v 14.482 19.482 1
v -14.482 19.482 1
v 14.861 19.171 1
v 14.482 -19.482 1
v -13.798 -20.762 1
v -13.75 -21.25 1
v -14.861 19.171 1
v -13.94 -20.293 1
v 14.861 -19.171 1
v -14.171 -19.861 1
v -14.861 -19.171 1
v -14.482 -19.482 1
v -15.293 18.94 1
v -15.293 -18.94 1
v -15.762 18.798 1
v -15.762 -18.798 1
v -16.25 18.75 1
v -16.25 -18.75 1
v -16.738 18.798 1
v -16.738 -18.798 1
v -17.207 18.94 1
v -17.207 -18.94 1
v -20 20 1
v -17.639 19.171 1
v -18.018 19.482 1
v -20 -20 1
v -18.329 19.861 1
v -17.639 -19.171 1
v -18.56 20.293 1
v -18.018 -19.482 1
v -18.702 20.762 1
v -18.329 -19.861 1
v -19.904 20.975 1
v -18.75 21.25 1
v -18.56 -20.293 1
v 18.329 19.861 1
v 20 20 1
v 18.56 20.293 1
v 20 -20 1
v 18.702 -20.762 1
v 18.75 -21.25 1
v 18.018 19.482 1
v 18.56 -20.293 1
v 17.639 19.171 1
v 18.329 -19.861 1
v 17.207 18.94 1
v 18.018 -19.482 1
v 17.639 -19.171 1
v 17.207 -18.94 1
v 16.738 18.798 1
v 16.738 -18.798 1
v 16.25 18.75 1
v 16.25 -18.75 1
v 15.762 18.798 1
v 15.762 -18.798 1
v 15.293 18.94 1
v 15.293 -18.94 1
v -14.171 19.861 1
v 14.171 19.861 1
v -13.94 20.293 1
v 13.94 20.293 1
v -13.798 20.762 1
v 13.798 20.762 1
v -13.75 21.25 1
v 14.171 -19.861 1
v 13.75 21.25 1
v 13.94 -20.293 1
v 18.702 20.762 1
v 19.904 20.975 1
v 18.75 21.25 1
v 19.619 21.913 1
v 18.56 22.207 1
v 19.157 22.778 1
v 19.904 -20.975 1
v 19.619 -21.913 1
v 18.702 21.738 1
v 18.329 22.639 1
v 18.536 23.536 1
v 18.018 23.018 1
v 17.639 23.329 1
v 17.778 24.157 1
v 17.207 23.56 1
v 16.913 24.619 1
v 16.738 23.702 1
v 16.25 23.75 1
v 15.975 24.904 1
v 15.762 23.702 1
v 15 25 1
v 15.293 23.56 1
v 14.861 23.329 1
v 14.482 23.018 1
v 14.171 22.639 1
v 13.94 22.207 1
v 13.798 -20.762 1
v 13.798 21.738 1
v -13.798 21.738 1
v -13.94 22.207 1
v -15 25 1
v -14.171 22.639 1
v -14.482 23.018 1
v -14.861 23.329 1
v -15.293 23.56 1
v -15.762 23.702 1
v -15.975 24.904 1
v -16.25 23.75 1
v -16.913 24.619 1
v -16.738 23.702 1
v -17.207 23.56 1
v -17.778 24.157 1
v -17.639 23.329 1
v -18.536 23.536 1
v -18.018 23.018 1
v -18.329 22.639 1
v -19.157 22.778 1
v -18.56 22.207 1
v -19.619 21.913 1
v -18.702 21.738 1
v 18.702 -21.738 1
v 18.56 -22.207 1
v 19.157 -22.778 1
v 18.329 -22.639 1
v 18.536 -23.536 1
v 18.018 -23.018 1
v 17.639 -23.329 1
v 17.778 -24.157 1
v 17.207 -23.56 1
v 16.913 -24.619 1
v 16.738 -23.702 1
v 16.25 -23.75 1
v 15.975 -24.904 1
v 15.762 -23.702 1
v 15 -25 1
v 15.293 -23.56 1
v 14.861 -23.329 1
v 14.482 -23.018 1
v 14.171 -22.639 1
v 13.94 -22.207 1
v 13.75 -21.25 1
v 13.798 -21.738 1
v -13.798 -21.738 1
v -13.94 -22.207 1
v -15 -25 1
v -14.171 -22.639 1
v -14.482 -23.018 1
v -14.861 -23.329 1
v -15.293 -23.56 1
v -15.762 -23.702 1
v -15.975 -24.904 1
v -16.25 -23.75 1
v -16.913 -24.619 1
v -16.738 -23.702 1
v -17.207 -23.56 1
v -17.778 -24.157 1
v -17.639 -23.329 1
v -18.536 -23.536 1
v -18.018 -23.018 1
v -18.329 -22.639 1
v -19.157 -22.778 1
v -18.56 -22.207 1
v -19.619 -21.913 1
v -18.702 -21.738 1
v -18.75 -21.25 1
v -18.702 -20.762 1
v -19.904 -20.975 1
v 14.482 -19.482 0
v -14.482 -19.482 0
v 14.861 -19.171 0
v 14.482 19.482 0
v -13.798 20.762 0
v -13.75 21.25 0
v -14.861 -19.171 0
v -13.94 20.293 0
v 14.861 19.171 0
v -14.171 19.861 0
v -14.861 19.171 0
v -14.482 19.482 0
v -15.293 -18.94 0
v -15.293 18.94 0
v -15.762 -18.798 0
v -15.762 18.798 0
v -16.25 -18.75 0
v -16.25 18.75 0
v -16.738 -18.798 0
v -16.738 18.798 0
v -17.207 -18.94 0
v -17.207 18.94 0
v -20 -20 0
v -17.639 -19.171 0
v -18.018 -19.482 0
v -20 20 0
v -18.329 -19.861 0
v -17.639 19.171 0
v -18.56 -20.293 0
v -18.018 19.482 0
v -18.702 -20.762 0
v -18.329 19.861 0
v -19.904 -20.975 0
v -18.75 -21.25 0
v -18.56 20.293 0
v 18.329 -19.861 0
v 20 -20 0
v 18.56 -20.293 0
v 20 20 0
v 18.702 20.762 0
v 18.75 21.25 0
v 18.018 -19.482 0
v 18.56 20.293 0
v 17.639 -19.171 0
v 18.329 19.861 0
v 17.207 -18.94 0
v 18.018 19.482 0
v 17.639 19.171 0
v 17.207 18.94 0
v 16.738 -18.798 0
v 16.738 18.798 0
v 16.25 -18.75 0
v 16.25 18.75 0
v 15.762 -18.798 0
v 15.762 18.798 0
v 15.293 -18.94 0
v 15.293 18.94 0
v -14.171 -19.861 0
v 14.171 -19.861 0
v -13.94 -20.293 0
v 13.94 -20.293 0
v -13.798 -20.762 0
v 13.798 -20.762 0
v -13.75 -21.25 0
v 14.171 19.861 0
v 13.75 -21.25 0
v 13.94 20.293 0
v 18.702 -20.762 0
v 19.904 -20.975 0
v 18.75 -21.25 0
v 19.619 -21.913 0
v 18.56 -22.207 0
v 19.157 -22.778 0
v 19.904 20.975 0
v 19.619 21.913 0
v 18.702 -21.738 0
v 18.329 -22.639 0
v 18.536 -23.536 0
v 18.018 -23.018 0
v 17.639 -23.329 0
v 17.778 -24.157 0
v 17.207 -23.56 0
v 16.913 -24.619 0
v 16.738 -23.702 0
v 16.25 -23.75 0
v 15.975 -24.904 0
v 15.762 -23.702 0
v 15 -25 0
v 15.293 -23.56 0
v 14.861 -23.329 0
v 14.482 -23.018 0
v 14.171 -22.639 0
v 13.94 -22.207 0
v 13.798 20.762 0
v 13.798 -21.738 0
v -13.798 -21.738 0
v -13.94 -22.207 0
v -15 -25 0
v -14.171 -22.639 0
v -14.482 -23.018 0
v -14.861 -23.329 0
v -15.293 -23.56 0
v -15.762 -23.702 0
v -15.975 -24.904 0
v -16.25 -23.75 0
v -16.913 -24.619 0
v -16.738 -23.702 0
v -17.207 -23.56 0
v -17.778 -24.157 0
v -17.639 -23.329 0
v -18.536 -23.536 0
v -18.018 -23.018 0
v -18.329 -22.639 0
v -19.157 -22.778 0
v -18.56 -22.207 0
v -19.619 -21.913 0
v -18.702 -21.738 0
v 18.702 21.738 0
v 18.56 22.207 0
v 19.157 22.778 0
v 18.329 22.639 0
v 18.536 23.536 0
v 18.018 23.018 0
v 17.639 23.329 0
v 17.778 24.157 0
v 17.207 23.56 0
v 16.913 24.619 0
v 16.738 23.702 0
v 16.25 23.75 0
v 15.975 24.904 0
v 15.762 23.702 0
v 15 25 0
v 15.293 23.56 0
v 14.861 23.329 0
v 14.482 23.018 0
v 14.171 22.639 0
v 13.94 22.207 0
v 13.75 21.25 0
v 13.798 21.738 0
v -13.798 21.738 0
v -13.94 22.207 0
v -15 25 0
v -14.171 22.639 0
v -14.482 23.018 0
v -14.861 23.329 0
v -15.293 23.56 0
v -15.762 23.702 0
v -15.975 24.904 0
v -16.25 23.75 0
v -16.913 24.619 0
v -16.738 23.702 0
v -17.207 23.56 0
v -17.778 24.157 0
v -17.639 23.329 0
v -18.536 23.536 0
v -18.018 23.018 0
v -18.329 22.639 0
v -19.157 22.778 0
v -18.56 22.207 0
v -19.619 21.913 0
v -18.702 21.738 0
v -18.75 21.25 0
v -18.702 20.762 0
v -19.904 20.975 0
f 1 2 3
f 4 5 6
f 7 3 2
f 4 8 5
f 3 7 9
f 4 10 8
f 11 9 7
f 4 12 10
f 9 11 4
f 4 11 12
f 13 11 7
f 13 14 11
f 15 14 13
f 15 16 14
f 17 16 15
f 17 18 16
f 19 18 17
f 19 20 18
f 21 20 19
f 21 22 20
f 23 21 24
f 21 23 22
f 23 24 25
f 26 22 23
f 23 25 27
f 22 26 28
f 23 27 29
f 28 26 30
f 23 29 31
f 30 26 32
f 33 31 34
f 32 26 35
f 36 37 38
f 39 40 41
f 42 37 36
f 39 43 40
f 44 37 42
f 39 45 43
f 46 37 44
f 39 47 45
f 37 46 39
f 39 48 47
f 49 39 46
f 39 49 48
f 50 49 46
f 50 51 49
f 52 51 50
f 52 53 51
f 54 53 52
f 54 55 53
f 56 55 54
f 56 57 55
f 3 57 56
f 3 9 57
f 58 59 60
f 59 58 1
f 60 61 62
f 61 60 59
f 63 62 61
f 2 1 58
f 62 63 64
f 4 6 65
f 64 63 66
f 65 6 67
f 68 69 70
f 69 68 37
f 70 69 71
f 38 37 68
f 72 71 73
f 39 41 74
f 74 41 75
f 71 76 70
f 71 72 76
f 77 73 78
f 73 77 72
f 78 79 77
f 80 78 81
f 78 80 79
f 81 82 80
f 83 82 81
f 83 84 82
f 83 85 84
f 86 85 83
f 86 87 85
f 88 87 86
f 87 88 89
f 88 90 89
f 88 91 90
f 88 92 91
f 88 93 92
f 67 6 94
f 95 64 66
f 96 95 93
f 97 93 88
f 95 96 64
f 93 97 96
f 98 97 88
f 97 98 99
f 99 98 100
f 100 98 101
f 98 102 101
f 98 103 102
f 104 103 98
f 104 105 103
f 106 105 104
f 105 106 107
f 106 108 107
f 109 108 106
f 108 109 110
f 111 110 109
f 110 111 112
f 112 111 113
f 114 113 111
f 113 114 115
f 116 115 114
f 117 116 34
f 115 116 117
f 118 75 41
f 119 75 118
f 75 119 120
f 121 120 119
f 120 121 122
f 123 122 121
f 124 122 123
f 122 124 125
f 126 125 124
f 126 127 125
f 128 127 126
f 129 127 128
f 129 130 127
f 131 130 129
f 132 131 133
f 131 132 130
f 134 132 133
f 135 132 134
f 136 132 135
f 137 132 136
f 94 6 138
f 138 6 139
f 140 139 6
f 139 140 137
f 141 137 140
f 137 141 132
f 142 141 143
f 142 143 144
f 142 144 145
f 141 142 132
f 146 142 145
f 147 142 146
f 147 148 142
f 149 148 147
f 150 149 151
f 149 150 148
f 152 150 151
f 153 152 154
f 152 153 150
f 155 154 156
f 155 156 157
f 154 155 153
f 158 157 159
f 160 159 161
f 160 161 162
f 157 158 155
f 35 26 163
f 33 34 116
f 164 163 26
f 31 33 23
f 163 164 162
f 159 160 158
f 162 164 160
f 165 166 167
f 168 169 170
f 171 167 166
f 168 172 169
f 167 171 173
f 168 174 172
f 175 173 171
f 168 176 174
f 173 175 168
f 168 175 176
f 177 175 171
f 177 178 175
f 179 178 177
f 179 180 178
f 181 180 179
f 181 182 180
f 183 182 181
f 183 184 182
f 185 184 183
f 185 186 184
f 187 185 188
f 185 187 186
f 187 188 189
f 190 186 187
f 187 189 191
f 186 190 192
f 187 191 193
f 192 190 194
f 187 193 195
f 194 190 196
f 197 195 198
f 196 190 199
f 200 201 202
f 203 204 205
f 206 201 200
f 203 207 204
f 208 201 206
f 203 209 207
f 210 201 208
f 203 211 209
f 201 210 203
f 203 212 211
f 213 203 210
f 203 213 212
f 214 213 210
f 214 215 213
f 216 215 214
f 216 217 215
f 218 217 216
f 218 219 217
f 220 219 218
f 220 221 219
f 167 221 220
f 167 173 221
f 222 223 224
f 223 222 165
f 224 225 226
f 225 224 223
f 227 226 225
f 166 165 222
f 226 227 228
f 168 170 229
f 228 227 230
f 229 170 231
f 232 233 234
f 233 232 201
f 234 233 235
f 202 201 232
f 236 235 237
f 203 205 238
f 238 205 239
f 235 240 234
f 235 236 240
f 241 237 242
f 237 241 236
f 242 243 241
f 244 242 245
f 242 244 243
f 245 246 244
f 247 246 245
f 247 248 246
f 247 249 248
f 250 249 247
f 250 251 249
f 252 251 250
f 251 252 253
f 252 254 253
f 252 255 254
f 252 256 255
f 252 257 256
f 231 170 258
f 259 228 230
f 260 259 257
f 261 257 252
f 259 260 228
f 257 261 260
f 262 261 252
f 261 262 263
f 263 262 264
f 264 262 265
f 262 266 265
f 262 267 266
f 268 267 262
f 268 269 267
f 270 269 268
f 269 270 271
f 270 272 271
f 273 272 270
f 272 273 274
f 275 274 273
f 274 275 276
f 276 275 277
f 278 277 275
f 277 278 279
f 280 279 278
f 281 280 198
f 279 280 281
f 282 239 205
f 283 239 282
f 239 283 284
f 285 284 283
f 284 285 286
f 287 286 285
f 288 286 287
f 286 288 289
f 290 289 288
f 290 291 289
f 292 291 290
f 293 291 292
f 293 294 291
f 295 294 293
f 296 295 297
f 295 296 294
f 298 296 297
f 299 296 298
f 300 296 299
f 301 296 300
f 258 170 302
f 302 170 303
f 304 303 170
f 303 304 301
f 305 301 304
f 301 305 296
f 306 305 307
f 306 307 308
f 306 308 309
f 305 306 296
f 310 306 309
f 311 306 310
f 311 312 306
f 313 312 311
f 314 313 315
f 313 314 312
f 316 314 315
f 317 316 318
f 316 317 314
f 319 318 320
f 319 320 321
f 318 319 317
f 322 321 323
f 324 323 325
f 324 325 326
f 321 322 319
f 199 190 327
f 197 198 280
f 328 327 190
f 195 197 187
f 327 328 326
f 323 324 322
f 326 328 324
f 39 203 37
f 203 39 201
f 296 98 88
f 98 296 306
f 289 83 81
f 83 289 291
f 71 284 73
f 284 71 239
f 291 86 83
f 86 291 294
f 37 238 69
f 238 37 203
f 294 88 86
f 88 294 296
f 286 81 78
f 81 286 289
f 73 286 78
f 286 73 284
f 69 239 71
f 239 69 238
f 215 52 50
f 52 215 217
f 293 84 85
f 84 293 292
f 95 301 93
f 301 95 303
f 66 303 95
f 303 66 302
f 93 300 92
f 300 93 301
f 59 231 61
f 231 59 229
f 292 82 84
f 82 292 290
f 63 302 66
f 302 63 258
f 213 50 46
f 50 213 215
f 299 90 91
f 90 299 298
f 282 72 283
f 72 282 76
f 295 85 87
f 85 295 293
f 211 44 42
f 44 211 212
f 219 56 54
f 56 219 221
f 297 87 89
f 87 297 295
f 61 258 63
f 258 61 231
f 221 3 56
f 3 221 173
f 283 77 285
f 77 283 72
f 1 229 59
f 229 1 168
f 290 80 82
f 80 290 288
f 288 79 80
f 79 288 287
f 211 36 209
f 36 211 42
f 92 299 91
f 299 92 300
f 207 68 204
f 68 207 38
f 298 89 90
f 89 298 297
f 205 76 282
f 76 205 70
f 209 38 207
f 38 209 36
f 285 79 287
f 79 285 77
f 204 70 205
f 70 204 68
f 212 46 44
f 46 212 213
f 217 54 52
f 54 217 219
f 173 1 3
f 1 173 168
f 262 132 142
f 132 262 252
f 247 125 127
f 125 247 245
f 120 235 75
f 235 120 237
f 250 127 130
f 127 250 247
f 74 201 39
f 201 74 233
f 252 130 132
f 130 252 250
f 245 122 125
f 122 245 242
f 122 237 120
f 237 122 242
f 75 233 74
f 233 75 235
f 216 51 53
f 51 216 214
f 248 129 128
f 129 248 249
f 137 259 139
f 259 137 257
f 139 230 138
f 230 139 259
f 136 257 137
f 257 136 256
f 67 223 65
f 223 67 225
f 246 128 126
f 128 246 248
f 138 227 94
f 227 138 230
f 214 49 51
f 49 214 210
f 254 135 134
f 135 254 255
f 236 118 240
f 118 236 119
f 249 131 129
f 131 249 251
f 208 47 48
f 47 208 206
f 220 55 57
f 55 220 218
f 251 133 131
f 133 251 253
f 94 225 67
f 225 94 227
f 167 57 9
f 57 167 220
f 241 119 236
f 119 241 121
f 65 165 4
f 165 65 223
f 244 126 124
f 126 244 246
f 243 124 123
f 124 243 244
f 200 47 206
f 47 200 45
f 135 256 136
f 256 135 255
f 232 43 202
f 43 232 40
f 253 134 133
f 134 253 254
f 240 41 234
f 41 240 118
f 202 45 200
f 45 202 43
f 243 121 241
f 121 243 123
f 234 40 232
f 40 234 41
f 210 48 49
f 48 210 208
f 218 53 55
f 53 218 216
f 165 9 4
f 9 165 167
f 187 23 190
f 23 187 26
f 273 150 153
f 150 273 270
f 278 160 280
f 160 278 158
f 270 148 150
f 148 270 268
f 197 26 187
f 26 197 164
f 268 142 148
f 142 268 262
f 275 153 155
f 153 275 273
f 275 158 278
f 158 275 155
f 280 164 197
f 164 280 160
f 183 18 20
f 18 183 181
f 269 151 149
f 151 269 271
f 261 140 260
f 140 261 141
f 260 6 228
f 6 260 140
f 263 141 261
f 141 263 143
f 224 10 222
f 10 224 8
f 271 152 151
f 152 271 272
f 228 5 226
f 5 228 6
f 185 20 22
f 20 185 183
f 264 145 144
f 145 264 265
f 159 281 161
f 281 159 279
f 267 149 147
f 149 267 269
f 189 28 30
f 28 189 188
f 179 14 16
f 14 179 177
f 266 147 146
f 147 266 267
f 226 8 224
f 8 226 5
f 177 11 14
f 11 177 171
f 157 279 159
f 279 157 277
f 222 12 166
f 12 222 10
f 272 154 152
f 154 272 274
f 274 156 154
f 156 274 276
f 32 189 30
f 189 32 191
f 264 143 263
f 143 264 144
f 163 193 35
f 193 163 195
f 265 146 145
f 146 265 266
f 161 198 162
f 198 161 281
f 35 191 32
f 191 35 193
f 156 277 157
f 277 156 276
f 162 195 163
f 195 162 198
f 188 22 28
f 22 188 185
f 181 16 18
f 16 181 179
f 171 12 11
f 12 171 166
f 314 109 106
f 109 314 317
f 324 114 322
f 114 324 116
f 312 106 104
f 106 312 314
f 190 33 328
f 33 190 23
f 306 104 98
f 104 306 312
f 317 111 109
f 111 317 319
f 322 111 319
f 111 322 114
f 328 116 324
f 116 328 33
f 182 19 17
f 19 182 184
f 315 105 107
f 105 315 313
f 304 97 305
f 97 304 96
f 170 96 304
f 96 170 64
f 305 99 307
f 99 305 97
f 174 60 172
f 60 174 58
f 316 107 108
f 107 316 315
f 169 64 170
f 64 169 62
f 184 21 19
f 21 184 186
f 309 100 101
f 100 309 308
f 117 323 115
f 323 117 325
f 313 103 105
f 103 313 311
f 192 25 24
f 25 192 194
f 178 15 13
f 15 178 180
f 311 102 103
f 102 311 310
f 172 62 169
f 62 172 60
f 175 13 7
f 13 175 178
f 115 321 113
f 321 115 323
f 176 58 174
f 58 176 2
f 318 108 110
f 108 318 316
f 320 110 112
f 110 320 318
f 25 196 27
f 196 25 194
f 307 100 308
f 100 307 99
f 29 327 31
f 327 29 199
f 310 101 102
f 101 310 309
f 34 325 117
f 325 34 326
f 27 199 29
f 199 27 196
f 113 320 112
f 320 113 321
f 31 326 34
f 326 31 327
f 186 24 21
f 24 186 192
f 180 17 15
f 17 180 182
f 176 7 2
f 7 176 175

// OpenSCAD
union() {
	union() {
		union() {
			union() {
				union() {
					translate(v = [15.0000000000, 20.0000000000, 0.0000000000]) {
						mirror(v = [1, 0, 0]) {
							translate(v = [-15.0000000000, -20.0000000000, -0.0000000000]) {
								color(c = "mediumvioletred") {
									translate(v = [15, 20, 0]) {
										difference() {
											union() {
												difference() {
													color(c = "steelblue") {
														translate(v = [0, 0, 0.5000000000]) {
															cube(center = true, size = [10, 10, 1]);
														}
													}
													translate(v = [0.0000000000, 2.5000000000, 0.0000000000]) {
														translate(v = [-2.5000000000, 0.0000000000, 0.0000000000]) {
															color(c = "darkmagenta") {
																translate(v = [0, 0, 0.5000000000]) {
																	cube(center = true, size = [5, 5, 1]);
																}
															}
														}
													}
												}
												color(c = "orange") {
													translate(v = [0, 0, 0.5000000000]) {
														cylinder(r1 = 5, $fn = 32, h = 1, r = 5, center = true);
													}
												}
											}
											translate(v = [0.0000000000, 1.2500000000, 0.0000000000]) {
												translate(v = [-1.2500000000, 0.0000000000, 0.0000000000]) {
													color(c = "tomato") {
														translate(v = [0, 0, 0.5000000000]) {
															cylinder(r1 = 2.5000000000, $fn = 32, h = 1, r = 2.5000000000, center = true);
														}
													}
												}
											}
										}
									}
								}
							}
						}
					}
					translate(v = [15.0000000000, -20.0000000000, 0.0000000000]) {
						mirror(v = [1, 0, 0]) {
							translate(v = [-15.0000000000, 20.0000000000, -0.0000000000]) {
								translate(v = [15.0000000000, -20.0000000000, 0.0000000000]) {
									mirror(v = [0, 1, 0]) {
										translate(v = [-15.0000000000, 20.0000000000, -0.0000000000]) {
											color(c = "firebrick") {
												translate(v = [15, -20, 0]) {
													difference() {
														union() {
															difference() {
																color(c = "steelblue") {
																	translate(v = [0, 0, 0.5000000000]) {
																		cube(center = true, size = [10, 10, 1]);
																	}
																}
																translate(v = [0.0000000000, 2.5000000000, 0.0000000000]) {
																	translate(v = [-2.5000000000, 0.0000000000, 0.0000000000]) {
																		color(c = "darkmagenta") {
																			translate(v = [0, 0, 0.5000000000]) {
																				cube(center = true, size = [5, 5, 1]);
																			}
																		}
																	}
																}
															}
															color(c = "orange") {
																translate(v = [0, 0, 0.5000000000]) {
																	cylinder(r1 = 5, $fn = 32, h = 1, r = 5, center = true);
																}
															}
														}
														translate(v = [0.0000000000, 1.2500000000, 0.0000000000]) {
															translate(v = [-1.2500000000, 0.0000000000, 0.0000000000]) {
																color(c = "tomato") {
																	translate(v = [0, 0, 0.5000000000]) {
																		cylinder(r1 = 2.5000000000, $fn = 32, h = 1, r = 2.5000000000, center = true);
																	}
																}
															}
														}
													}
												}
											}
										}
									}
								}
							}
						}
					}
				}
				translate(v = [-15.0000000000, -20.0000000000, 0.0000000000]) {
					mirror(v = [0, 1, 0]) {
						translate(v = [15.0000000000, 20.0000000000, -0.0000000000]) {
							color(c = "teal") {
								translate(v = [-15, -20, 0]) {
									difference() {
										union() {
											difference() {
												color(c = "steelblue") {
													translate(v = [0, 0, 0.5000000000]) {
														cube(center = true, size = [10, 10, 1]);
													}
												}
												translate(v = [0.0000000000, 2.5000000000, 0.0000000000]) {
													translate(v = [-2.5000000000, 0.0000000000, 0.0000000000]) {
														color(c = "darkmagenta") {
															translate(v = [0, 0, 0.5000000000]) {
																cube(center = true, size = [5, 5, 1]);
															}
														}
													}
												}
											}
											color(c = "orange") {
												translate(v = [0, 0, 0.5000000000]) {
													cylinder(r1 = 5, $fn = 32, h = 1, r = 5, center = true);
												}
											}
										}
										translate(v = [0.0000000000, 1.2500000000, 0.0000000000]) {
											translate(v = [-1.2500000000, 0.0000000000, 0.0000000000]) {
												color(c = "tomato") {
													translate(v = [0, 0, 0.5000000000]) {
														cylinder(r1 = 2.5000000000, $fn = 32, h = 1, r = 2.5000000000, center = true);
													}
												}
											}
										}
									}
								}
							}
						}
					}
				}
			}
			color(c = "saddlebrown") {
				translate(v = [-15, 20, 0]) {
					difference() {
						union() {
							difference() {
								color(c = "steelblue") {
									translate(v = [0, 0, 0.5000000000]) {
										cube(center = true, size = [10, 10, 1]);
									}
								}
								translate(v = [0.0000000000, 2.5000000000, 0.0000000000]) {
									translate(v = [-2.5000000000, 0.0000000000, 0.0000000000]) {
										color(c = "darkmagenta") {
											translate(v = [0, 0, 0.5000000000]) {
												cube(center = true, size = [5, 5, 1]);
											}
										}
									}
								}
							}
							color(c = "orange") {
								translate(v = [0, 0, 0.5000000000]) {
									cylinder(r1 = 5, $fn = 32, h = 1, r = 5, center = true);
								}
							}
						}
						translate(v = [0.0000000000, 1.2500000000, 0.0000000000]) {
							translate(v = [-1.2500000000, 0.0000000000, 0.0000000000]) {
								color(c = "tomato") {
									translate(v = [0, 0, 0.5000000000]) {
										cylinder(r1 = 2.5000000000, $fn = 32, h = 1, r = 2.5000000000, center = true);
									}
								}
							}
						}
					}
				}
			}
		}
		color(c = "springgreen") {
			translate(v = [0, 0, 0.5000000000]) {
				cube(center = true, size = [40, 30, 1]);
			}
		}
	}
	color(c = "teal") {
		translate(v = [0, 0, 0.5000000000]) {
			cube(center = true, size = [20, 50, 1]);
		}
	}
}
